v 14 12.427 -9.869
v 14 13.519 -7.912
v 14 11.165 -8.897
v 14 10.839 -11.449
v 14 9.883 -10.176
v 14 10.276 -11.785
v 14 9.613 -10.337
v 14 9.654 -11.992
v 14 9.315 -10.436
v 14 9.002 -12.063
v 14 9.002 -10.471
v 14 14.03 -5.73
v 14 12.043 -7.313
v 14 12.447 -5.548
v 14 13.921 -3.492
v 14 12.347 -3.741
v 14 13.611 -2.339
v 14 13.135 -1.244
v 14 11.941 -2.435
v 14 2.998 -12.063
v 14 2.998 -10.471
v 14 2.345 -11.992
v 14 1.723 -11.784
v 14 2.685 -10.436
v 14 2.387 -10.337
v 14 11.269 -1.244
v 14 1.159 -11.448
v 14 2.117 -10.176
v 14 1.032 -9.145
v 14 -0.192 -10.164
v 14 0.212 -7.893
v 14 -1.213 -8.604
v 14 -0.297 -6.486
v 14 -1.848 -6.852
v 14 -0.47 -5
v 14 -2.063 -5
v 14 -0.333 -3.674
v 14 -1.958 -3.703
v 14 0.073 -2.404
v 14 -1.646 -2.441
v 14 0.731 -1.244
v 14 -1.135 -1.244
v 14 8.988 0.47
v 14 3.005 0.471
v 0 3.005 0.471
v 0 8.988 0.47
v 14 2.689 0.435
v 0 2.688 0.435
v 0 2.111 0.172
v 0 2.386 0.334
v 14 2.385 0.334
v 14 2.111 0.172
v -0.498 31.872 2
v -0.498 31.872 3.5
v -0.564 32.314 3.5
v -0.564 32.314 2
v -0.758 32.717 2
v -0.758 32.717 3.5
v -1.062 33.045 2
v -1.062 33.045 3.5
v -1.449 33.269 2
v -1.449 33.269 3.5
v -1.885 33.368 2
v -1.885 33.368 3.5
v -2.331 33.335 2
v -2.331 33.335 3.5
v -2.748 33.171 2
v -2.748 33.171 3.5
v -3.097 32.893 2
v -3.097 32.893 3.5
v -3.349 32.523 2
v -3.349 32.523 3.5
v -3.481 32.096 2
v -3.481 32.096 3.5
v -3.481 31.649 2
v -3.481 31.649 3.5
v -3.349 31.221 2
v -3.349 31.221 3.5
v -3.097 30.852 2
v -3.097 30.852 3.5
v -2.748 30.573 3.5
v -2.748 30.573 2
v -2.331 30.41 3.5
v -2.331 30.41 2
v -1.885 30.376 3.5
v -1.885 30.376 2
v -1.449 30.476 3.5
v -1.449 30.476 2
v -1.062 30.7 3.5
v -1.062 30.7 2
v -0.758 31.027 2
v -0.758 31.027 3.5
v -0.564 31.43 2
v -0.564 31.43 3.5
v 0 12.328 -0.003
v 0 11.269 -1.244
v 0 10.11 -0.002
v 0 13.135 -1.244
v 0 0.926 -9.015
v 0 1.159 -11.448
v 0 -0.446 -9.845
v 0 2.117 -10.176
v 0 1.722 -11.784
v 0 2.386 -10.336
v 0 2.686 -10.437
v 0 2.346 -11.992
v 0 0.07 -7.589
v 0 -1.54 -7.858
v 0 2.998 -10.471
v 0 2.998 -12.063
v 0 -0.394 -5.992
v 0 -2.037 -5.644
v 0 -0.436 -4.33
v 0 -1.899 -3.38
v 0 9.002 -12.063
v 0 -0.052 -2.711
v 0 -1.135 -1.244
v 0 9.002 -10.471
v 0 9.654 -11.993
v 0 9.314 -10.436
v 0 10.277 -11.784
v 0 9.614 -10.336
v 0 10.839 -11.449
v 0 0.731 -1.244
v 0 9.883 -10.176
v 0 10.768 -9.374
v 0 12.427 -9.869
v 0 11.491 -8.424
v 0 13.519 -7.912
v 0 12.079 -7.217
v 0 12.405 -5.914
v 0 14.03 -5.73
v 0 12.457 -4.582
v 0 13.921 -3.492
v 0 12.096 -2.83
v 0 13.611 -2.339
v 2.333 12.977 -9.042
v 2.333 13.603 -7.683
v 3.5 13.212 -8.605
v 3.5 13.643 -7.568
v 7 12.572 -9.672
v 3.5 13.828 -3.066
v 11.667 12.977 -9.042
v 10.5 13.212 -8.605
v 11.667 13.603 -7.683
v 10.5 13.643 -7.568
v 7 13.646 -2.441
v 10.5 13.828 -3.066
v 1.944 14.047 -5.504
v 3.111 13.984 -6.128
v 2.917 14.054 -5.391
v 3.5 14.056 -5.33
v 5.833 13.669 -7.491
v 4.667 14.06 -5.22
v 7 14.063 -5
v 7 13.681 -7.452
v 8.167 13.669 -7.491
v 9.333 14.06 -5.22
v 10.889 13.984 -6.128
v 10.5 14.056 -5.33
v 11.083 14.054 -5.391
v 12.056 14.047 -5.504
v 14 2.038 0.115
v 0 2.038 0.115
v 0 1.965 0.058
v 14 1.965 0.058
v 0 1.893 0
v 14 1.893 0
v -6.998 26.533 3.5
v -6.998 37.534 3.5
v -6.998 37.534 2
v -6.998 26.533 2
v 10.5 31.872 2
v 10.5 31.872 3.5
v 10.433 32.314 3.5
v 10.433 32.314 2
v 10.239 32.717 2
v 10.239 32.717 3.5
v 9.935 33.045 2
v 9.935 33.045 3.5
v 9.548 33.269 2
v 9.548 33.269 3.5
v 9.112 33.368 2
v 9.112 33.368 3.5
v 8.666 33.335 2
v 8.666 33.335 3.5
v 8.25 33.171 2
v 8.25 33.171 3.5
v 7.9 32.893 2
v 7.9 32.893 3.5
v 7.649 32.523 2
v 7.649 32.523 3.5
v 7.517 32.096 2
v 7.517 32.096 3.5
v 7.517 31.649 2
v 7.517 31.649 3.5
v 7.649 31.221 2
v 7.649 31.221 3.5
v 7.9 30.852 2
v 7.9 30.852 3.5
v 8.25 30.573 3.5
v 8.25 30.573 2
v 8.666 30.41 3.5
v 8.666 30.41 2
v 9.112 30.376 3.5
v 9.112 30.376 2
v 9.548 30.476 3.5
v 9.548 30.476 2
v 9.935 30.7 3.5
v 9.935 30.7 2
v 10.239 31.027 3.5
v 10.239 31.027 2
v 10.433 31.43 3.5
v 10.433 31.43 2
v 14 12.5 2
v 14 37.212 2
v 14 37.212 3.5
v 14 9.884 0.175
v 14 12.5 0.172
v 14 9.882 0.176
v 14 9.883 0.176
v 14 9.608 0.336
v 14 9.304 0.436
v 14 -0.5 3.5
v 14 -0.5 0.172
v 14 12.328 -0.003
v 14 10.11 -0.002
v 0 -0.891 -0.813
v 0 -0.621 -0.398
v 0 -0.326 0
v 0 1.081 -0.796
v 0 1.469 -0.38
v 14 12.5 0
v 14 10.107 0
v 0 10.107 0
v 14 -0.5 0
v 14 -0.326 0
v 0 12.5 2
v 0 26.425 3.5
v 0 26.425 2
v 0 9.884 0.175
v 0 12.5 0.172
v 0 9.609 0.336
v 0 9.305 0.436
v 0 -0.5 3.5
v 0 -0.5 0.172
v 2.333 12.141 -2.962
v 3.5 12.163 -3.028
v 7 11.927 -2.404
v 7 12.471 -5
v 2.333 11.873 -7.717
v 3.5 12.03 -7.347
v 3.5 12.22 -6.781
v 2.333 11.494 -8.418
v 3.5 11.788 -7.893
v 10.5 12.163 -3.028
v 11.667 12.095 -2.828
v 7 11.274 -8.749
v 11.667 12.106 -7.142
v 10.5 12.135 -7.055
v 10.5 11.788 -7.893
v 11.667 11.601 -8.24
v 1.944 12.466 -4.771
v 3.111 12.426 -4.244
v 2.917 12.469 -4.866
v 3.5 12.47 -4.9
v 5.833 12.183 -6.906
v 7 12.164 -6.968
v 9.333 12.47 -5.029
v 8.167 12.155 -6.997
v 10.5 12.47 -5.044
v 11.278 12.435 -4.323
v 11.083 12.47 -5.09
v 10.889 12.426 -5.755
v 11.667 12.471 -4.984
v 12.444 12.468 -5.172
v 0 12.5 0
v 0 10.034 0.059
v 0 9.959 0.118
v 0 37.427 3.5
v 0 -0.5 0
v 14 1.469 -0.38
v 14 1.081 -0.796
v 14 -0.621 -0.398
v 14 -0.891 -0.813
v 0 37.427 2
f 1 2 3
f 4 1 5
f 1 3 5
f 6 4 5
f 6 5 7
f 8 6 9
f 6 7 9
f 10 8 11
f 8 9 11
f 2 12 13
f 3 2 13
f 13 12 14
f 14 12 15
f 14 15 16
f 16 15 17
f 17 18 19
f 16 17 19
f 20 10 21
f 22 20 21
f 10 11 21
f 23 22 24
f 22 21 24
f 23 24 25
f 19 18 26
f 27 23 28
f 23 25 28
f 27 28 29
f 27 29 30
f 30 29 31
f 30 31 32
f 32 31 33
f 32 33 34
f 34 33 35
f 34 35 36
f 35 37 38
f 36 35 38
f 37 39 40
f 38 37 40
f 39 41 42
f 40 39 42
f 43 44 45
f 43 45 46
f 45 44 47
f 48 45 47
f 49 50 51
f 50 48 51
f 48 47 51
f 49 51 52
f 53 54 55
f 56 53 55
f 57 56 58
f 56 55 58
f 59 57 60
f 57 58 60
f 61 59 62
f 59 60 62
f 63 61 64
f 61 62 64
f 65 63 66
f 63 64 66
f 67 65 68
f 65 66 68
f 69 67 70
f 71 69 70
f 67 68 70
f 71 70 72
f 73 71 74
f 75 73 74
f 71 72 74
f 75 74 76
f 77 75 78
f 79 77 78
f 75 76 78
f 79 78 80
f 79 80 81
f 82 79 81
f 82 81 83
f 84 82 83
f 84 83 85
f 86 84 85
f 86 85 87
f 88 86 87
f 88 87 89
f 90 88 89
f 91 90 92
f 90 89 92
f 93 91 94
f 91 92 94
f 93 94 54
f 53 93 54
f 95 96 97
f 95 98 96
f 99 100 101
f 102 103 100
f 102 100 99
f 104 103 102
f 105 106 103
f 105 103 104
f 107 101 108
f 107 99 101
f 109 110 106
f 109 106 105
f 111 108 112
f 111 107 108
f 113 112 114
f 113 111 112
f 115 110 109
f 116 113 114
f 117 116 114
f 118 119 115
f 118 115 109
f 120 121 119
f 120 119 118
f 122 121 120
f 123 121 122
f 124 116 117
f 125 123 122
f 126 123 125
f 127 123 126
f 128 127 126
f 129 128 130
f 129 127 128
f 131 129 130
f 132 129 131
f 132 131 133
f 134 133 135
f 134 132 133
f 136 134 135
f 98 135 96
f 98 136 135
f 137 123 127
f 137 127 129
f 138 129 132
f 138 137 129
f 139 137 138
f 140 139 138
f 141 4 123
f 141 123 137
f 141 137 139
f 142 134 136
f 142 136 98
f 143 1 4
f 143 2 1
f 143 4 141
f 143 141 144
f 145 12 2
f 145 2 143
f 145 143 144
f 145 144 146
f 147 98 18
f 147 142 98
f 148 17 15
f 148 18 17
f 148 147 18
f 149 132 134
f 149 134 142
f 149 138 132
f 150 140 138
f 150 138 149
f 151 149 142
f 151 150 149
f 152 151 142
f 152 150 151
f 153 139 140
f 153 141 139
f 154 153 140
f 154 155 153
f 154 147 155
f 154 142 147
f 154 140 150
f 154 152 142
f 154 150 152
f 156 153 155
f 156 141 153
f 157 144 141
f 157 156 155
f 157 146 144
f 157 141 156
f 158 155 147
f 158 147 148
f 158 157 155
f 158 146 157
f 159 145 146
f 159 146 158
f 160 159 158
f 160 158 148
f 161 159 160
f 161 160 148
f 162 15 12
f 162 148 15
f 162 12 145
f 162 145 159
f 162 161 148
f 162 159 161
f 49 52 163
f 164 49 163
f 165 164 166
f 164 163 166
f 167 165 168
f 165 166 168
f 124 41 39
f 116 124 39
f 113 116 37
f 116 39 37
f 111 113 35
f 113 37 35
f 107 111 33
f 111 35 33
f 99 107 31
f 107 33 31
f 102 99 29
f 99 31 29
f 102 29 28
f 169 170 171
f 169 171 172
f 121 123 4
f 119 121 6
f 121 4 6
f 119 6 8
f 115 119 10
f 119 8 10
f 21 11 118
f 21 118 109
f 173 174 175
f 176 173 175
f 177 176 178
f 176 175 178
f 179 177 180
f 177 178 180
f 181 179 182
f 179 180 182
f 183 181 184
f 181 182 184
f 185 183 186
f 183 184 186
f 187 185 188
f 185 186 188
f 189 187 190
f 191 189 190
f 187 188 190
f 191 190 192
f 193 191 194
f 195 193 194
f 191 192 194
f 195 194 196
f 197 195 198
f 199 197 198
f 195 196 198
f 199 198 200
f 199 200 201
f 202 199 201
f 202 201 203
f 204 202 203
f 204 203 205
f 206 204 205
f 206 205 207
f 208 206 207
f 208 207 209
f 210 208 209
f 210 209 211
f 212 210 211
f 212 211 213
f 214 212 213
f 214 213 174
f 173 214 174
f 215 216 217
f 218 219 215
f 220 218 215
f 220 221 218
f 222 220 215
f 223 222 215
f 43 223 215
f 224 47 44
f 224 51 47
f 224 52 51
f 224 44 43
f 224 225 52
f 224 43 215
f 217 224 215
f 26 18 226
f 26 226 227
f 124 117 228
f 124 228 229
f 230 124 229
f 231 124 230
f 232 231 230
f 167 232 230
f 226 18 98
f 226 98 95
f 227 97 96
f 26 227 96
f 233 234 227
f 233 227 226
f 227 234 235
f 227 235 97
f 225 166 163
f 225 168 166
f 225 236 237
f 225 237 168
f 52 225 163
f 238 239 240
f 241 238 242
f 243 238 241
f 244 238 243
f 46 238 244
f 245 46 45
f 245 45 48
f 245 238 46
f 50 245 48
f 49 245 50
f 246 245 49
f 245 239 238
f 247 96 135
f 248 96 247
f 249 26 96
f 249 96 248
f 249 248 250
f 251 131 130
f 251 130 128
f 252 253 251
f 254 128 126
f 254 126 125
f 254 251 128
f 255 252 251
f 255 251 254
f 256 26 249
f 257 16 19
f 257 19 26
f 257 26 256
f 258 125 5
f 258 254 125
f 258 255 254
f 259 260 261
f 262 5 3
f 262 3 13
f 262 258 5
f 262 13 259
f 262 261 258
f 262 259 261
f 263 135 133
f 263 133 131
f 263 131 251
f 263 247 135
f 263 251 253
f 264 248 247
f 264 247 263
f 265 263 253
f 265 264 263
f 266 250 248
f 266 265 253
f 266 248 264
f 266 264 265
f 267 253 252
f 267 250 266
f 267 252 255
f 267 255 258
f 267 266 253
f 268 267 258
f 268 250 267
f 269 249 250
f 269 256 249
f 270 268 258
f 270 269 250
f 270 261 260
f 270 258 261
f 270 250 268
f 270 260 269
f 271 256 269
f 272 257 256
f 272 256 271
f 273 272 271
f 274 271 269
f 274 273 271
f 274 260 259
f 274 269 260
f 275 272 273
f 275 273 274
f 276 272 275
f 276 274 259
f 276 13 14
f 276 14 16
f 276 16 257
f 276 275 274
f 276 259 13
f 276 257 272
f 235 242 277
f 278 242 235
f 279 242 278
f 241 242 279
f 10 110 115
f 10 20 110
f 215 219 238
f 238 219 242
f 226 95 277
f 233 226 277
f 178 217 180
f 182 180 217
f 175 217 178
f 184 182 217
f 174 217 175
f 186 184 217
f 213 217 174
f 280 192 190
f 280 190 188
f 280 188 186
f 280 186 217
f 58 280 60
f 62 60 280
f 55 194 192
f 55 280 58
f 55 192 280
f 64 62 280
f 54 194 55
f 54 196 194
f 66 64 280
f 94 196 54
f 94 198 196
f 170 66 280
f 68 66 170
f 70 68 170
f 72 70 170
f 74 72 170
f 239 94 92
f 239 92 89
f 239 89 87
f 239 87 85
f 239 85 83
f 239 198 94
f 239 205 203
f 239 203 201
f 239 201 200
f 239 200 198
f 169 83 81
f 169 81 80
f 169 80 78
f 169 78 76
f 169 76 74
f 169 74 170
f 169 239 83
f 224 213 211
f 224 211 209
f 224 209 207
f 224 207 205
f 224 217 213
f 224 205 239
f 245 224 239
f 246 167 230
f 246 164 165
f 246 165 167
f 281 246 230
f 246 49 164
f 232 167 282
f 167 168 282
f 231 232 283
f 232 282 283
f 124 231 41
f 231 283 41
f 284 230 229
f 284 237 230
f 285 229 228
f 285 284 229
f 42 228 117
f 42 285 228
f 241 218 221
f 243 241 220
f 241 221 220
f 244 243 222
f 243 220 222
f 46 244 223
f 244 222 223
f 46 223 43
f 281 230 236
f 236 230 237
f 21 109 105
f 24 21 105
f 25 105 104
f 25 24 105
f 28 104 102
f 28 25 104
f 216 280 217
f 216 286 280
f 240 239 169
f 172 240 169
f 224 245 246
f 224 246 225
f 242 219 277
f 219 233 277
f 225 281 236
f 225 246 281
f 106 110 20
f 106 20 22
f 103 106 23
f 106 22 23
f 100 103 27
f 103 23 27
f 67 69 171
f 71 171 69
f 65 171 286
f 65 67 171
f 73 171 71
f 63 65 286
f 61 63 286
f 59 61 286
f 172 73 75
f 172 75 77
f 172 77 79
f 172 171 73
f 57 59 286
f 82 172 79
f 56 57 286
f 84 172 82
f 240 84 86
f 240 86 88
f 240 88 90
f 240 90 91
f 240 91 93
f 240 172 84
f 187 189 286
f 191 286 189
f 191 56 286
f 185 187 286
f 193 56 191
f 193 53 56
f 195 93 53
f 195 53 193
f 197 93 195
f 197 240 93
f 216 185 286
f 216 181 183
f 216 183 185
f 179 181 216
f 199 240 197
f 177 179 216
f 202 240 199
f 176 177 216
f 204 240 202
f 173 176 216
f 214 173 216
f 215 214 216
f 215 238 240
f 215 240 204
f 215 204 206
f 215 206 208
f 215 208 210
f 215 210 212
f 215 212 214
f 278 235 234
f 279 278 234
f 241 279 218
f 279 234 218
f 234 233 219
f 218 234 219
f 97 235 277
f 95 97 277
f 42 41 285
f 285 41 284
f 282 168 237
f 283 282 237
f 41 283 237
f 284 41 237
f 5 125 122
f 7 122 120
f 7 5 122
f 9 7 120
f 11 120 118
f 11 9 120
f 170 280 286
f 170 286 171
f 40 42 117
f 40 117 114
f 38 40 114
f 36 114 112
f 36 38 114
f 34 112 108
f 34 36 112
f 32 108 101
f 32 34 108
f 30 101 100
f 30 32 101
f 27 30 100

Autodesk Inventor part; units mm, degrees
ref_plane "YZ Plane" through (0, 0, 0) normal (1, 0, 0) x (0, 1, 0)
ref_plane "XZ Plane" through (0, 0, 0) normal (0, 1, 0) x (-1, 0, 0)
sketch "Sketch1" plane through (0, 0, 0) normal (0, 0, 1) x (1, 0, 0)
  line L0 (1, 9) -> (14, 9) projected
  line L1 (1, 3) -> (1, 9) projected
  line L2 (14, 3) -> (1, 3) projected
  line L3 (14, 9) -> (14, 3) projected
  line L4 (1, 12) -> (14, 12)
  line L5 (1, 0) -> (14, 0)
  line L6 (1, 12.5) -> (14, 12.5)
  line L7 (1, -0.5) -> (14, -0.5)
  line L8 (0, 1.4) -> (0, 10.6) projected
  line L9 (0, -0.5) -> (14, -0.5)
  line L10 (14, -0.5) -> (14, 12.5)
  line L11 (14, 12.5) -> (0, 12.5)
  line L12 (0, 12.5) -> (0, -0.5)
  point P0 (0, 0)
  dimension "d0" = 0.5
  dimension "d1" = 0.5
extrude "Extrusion1" add sketch "Sketch1" along normal blind 2
sketch "Sketch2" plane through (14, -0.5, 0) normal (1, 0, 0) x (0, 0, -1)
  line L0 (10, 9.5) -> (10, 3.5) projected
  line L1 (10.5, 9.5) -> (10.5, 3.5)
  line L2 (0, 13) -> (0, 0) projected
  line L3 (0.0028, 13) -> (0, 0)
  arc A0 (5, 0.5) -> (9.8, 2.9) centre (5, 6.5) ccw projected
  spline S0 degree 3 poles (9.8, 10.1) (9.3822, 10.6561) (8.439, 11.5426) (6.738, 12.3306) (5.0002, 12.5848) (3.2616, 12.3308) (1.5615, 11.5422) (0.6175, 10.6564) (0.2, 10.1) knots 0.000048 0.000048 0.000048 0.000048 1.982593 3.634064 5.285536 6.937008 8.58848 10.571071 10.571071 10.571071 10.571071 weights 1 1 1 1 1 1 1 1 1 projected
  arc A1 (0.2, 2.9) -> (5, 0.5) centre (5, 6.5) ccw projected
  ellipse E0 centre (0.7683, 3.4229) end of major axis (0.4925, 4.2518) minor radius 0.7558 (0, 3.5) -> (0.2, 2.9) ccw projected
  ellipse E1 centre (0.7685, 9.5775) end of major axis (1.0457, 10.4061) minor radius 0.7558 (0.2, 10.1) -> (0, 9.5) ccw projected
  ellipse E2 centre (9.2317, 3.4229) end of major axis (9.5075, 4.2518) minor radius 0.7558 (9.8, 2.9) -> (10, 3.5) ccw projected
  ellipse E3 centre (9.2318, 9.5768) end of major axis (8.9568, 10.4058) minor radius 0.7558 (10, 9.5) -> (9.7999, 10.1) ccw projected
  arc A2 (5, 0.0295) -> (10.1758, 2.6168) centre (5, 6.5) ccw
  arc A3 (-0.1717, 2.6115) -> (5, 0.0295) centre (5, 6.5) ccw
  line L4 (10.4705, 3.4977) -> (10.4705, 9.5023)
  ellipse E4 centre (0.7683, 3.4229) end of major axis (0.3339, 4.718) minor radius 1.2242 (-0.4709, 3.5051) -> (-0.1717, 2.6115) ccw
  ellipse E5 centre (0.7685, 9.5775) end of major axis (1.1957, 10.8767) minor radius 1.2233 (-0.1748, 10.3845) -> (-0.4697, 9.4882) ccw
  arc A4 (0.2, 2.9) -> (9.8, 2.9) centre (5, 6.5) ccw projected
  arc A5 (5, -1.5631) -> (11.4481, 1.6589) centre (5, 6.5) ccw
  arc A6 (-1.4235, 1.6263) -> (5, -1.5631) centre (5, 6.5) ccw
  line L5 (12.0631, 3.4977) -> (12.0631, 9.5023)
  ellipse E6 centre (0.7683, 3.4229) end of major axis (-0.2657, 6.5587) minor radius 2.7801 (-2.0629, 3.5774) -> (-1.4235, 1.6263) ccw
  ellipse E7 centre (0.7685, 9.5775) end of major axis (1.7896, 12.7173) minor radius 2.7798 (-1.4322, 11.3622) -> (-2.0617, 9.4138) ccw
  line L6 (-0.4709, 3.5051) -> (-0.4697, 9.4882)
  line L7 (-2.0629, 3.5774) -> (-2.0617, 9.4138)
  spline S1 degree 5 poles (10.1762, 10.3826) (9.455, 11.3411) (8.5153, 12.1382) (7.3995, 12.6912) (5.0003, 13.2497) (2.6, 12.6917) (1.4857, 12.137) (0.5444, 11.3415) (-0.1764, 10.3824) knots 0 0 0 0 0 0 0.499984 0.499984 0.499984 1 1 1 1 1 1
  spline S2 degree 3 poles (10.1759, 2.6167) (10.3655, 2.8683) (10.4707, 3.1827) (10.4707, 3.4977) knots 0 0 0 0 1 1 1 1
  spline S3 degree 3 poles (10.4707, 9.5023) (10.4707, 9.8173) (10.3655, 10.1318) (10.1757, 10.3833) knots 0 0 0 0 1 1 1 1
  spline S4 degree 4 poles (11.4481, 1.6589) (11.7448, 2.0529) (11.9559, 2.5113) (12.0631, 3.0045) (12.0631, 3.4977) knots 0 0 0 0 0 1 1 1 1 1
  spline S5 degree 4 poles (12.0631, 9.5023) (12.0631, 9.995) (11.9561, 10.4877) (11.7455, 10.9457) (11.4492, 11.3395) knots 0 0 0 0 0 1 1 1 1 1
  spline S6 degree 5 poles (11.4495, 11.3391) (10.5511, 12.5335) (9.3795, 13.5256) (7.9898, 14.2154) (5.0062, 14.9093) (2.0215, 14.2187) (0.6377, 13.5325) (-0.5334, 12.5493) (-1.4322, 11.3622) knots 0 0 0 0 0 0 0.500955 0.500955 0.500955 1 1 1 1 1 1
  point P0 (0, 0.5)
  point P1 (0, 10.6069)
  point P2 (0, 12.8255)
  point P3 (0, 0.1744)
  point P4 (0, 2.393)
  point P5 (0.0005, 2.3924)
  point P6 (0, 0.1743)
  point P7 (0.0027, 12.8276)
  point P8 (0.0023, 10.6096)
extrude "Extrusion2" add sketch "Sketch2" along normal blind 2 contours L3 S6 S5 L5 S4 A5 A6 L2 A3 A2 S2 L4 S3 S1 | S1 E5 L6 E4 A3 L2 A6 E6 L7 E7 S6
sketch "Sketch3" plane through (14, 1.893, 0) normal (1, 0, 0) x (0, 0, -1)
  arc A0 (-0.1717, 0.2185) -> (0, 0) centre (5, 4.107) ccw projected
  line L0 (0, 0) -> (0, 8.2139) projected
  arc A1 (0, 8.2139) -> (-0.1748, 7.9915) centre (4.9785, 4.1209) ccw projected
  ellipse E0 centre (0.7685, 7.1845) end of major axis (0.3413, 5.8853) minor radius 1.2233 (-0.1748, 7.9915) -> (-0.4697, 7.0952) ccw projected
  line L1 (-0.4697, 7.0952) -> (-0.4709, 1.1121) projected
  ellipse E1 centre (0.7683, 1.03) end of major axis (1.2028, -0.2651) minor radius 1.2242 (-0.4709, 1.1121) -> (-0.1717, 0.2185) ccw projected
  point P0 (0, -1.893)
extrude "Extrusion3" cut sketch "Sketch3" against normal through all
sketch "Sketch4" plane through (14, -0.5, 0) normal (-1, 0, 0) x (0, 0, 1)
  line L0 (-10.4705, 9.5023) -> (-10.4705, 3.4977) projected
  ellipse E0 centre (-9.2512, 9.5832) end of major axis (-8.8307, 10.8511) minor radius 1.2058 (-10.1756, 10.3833) -> (-10.4705, 9.5023) ccw projected
  spline S0 degree 5 poles (-0.0023, 10.6096) (-0.7281, 11.4914) (-1.6474, 12.2152) (-2.7157, 12.7179) (-5.0579, 13.2362) (-7.3991, 12.6912) (-8.5148, 12.1385) (-9.4545, 11.3415) (-10.1756, 10.3833) knots 0 0 0 0 0 0 0.487709 0.487709 0.487709 1 1 1 1 1 1 projected
  line L1 (-0.0027, 12.8276) -> (-0.0023, 10.6096) projected
  spline S1 degree 5 poles (-11.4492, 11.3395) (-10.5511, 12.5335) (-9.3795, 13.5256) (-7.9898, 14.2154) (-5.4174, 14.8137) (-2.8441, 14.3827) (-1.8061, 14.0228) (-0.8486, 13.496) (-0.0027, 12.8277) knots 0 0 0 0 0 0 0.581033 0.581033 0.581033 1 1 1 1 1 1 projected
  ellipse E1 centre (-9.2769, 9.5918) end of major axis (-8.3583, 12.3614) minor radius 2.7713 (-11.4492, 11.3395) -> (-12.0631, 9.5023) ccw projected
  line L2 (-12.0631, 3.4977) -> (-12.0631, 9.5023) projected
  ellipse E2 centre (-9.2769, 3.4079) end of major axis (-10.1984, 6.1767) minor radius 2.7712 (-12.0631, 3.4977) -> (-11.4481, 1.6589) ccw projected
  arc A0 (-11.4481, 1.6589) -> (0, 0.1743) centre (-5, 6.5) ccw projected
  line L3 (-0.0005, 2.3924) -> (0, 0.1743) projected
  arc A1 (-10.1758, 2.6168) -> (-0.0005, 2.3924) centre (-5, 6.5) ccw projected
  ellipse E3 centre (-9.2512, 3.4164) end of major axis (-9.673, 4.684) minor radius 1.2058 (-10.4705, 3.4977) -> (-10.1758, 2.6168) ccw projected
  point P0 (0, 0.5)
extrude "Extrusion4" add sketch "Sketch4" along normal up to surface (14 mm away)
sketch "Sketch5" plane through (0, -0.5, 0) normal (0, -1, 0) x (1, 0, 0)
  line L0 (0, 2) -> (14, 2) projected
  line L1 (0, 2) -> (14, 2)
  line L2 (14, 2) -> (14, 3.5)
  line L3 (14, 3.5) -> (0, 3.5)
  line L4 (0, 3.5) -> (0, 2)
  point P0 (0, 0)
  dimension "d22" = 1.5
ref_plane "Work Plane1" through (-71.4012, 38.5222, -12.5) normal (0.0153412, 0.9998823, 0) x (0, 0, 1)
extrude "Extrusion5" add sketch "Sketch5" against normal up to surface surface through (-71.4012, 38.5222, -12.5) normal (0.0153412, 0.9998823, 0)
sketch "Sketch6" plane through (0, -0.5, 3.5) normal (0, 0, 1) x (1, 0, 0)
  line L0 (14, 0) -> (14, 37.7119) projected
  line L1 (14, 37.7119) -> (0, 37.9267) projected
  line L2 (-54.2389, 27.7576) -> (-67.6625, 27.9635) projected
  line L3 (14, 37.7119) -> (14, 26.7106)
  line L4 (14, 13) -> (14, 37.7119) projected
  line L5 (14, 26.7106) -> (-6.9975, 27.0328)
  line L6 (14, 37.7119) -> (-6.9975, 38.034)
  line L7 (-6.9975, 38.034) -> (-6.9975, 27.0328)
  point P0 (0, 0.5)
  point P1 (4.9084, 26.8501)
  dimension "d25" = 21
  dimension "d26" = 21
extrude "Extrusion6" add sketch "Sketch6" against normal blind 1.5
sketch "Sketch7" plane through (0, -0.5, 3.5) normal (0, 0, 1) x (1, 0, 0)
  line L0 (14, 0) -> (14, 37.7119) projected
  line L1 (14, -3.9463) -> (21.7341, -3.9463)
  line L2 (21.7341, -3.9463) -> (21.7341, 19.3789)
  line L3 (21.7341, 19.3789) -> (14, 19.3789)
  line L4 (14, 19.3789) -> (14, -3.9463)
  point P0 (0, 0.5)
extrude "Extrusion7" cut sketch "Sketch7" against normal blind 15.75
sketch "Sketch8" plane through (14, 10.1069, 0) normal (1, 0, 0) x (0, 0, -1)
  ellipse E0 centre (9.2512, -1.0236) end of major axis (8.8307, 0.2442) minor radius 1.2058 (10.4705, -1.1046) -> (10.1756, -0.2236) ccw projected
  line L0 (10.4705, -7.1091) -> (10.4705, -1.1046) projected
  ellipse E1 centre (9.2512, -7.1904) end of major axis (9.673, -5.9229) minor radius 1.2058 (10.1758, -7.9901) -> (10.4705, -7.1091) ccw projected
  arc A0 (0.0005, -8.2145) -> (10.1758, -7.9901) centre (5, -4.1069) ccw projected
  line L1 (0, -10.4326) -> (0.0005, -8.2145) projected
  arc A1 (0, -10.4326) -> (11.4481, -8.948) centre (5, -4.1069) ccw projected
  ellipse E2 centre (9.2769, -7.199) end of major axis (10.1984, -4.4302) minor radius 2.7712 (11.4481, -8.948) -> (12.0631, -7.1091) ccw projected
  line L2 (12.0631, -1.1046) -> (12.0631, -7.1091) projected
  ellipse E3 centre (9.2769, -1.0151) end of major axis (8.3583, 1.7545) minor radius 2.7713 (12.0631, -1.1046) -> (11.4492, 0.7326) ccw projected
  spline S0 degree 5 poles (0.0027, 2.2208) (0.8486, 2.8891) (1.8061, 3.4159) (2.8441, 3.7759) (5.4174, 4.2068) (7.9898, 3.6085) (9.3795, 2.9188) (10.5511, 1.9266) (11.4492, 0.7326) knots 0 0 0 0 0 0 0.418967 0.418967 0.418967 1 1 1 1 1 1 projected
  line L3 (0.0023, 0.0028) -> (0.0027, 2.2208) projected
  spline S1 degree 5 poles (10.1756, -0.2236) (9.4545, 0.7346) (8.5148, 1.5316) (7.3991, 2.0844) (5.0579, 2.6294) (2.7157, 2.111) (1.6474, 1.6084) (0.7281, 0.8845) (0.0023, 0.0027) knots 0 0 0 0 0 0 0.512291 0.512291 0.512291 1 1 1 1 1 1 projected
  arc A2 (-0.1717, -7.9954) -> (0, -8.2139) centre (5, -4.1069) ccw projected
  ellipse E4 centre (0.7683, -7.184) end of major axis (1.2028, -8.479) minor radius 1.2242 (-0.4709, -7.1018) -> (-0.1717, -7.9954) ccw projected
  ellipse E5 centre (0.7685, -1.0294) end of major axis (0.3413, -2.3286) minor radius 1.2233 (-0.1748, -0.2224) -> (-0.4697, -1.1187) ccw projected
  arc A3 (0, 0) -> (-0.1748, -0.2224) centre (4.9785, -4.093) ccw projected
  line L4 (-0.4697, -1.1187) -> (-0.4709, -7.1018) projected
  line L5 (0, 0) -> (0, 2.3931) projected
  line L6 (0, 2.3931) -> (-2, 2.3931) projected
  line L7 (0, -10.6069) -> (0, -8.2139) projected
  line L8 (0, -10.6069) -> (-3.5, -10.6069) projected
  line L9 (1.2443, -11.2419) -> (1.2443, -9.3759)
  arc A4 (0.0005, -8.2145) -> (10.1758, -7.9901) centre (5, -4.1069) ccw projected
  arc A5 (0.0005, -8.2145) -> (1.2443, -9.3759) centre (4.9979, -4.1091) ccw
  line L10 (0, -8.2139) -> (-0.1717, -7.9954)
  ellipse E6 centre (0.7683, -7.184) end of major axis (1.2028, -8.479) minor radius 1.2242 (-0.4709, -7.1018) -> (-0.1717, -7.9954) ccw projected
  line L11 (-0.1717, -7.9954) -> (-0.1717, -10.6069)
  line L12 (0, -10.6069) -> (-0.1717, -10.6069)
  line L13 (0, -10.6069) -> (0, -10.4326)
  arc A6 (0, -10.4326) -> (1.2443, -11.2419) centre (5, -4.1069) ccw
  line L14 (1.2444, 1.1622) -> (1.2444, 3.0282)
  arc A7 (1.2444, 3.0282) -> (0.0027, 2.2208) centre (4.9892, -4.0883) ccw
  line L15 (0, 2.3931) -> (0, 0) projected
  line L16 (0.0027, 2.2208) -> (0, 2.3931)
  line L17 (0, 2.3931) -> (-0.1717, 2.3931)
  line L18 (-0.1717, 2.3931) -> (-0.1748, -0.2224)
  line L19 (-0.1748, -0.2224) -> (0.0023, 0.0028)
  line L20 (0.0005, -8.2145) -> (0, -8.2139)
  point P0 (0, -10.1069)
extrude "Extrusion8" add sketch "Sketch8" against normal up to surface (14 mm away) contours S1 L3 S0 L14 | L19 L5 L16 L3 | L9 A1 L1 A0 | A3 L18 L6 L5 | L1 L7 L8 L11 A2
sketch "Sketch9" plane through (0, -0.5, 3.5) normal (0, 0, 1) x (1, 0, 0)
  line L0 (0, 0) -> (0, 26.9254) projected
  line L1 (14, 0) -> (0, 0) projected
  line L2 (14, 0) -> (14, 37.7119) projected
  line L3 (14, 37.7119) -> (-6.9975, 38.034) projected
  line L4 (-6.9975, 38.034) -> (-6.9975, 27.0328) projected
  line L5 (-6.9975, 27.0328) -> (0, 26.9254) projected
  line L6 (-6.9975, 38.034) -> (14, 37.7119) projected
  line L7 (-6.9975, 38.034) -> (14, 26.7132)
  line L8 (14, 13) -> (14, 37.7119) projected
  line L9 (14, 37.7119) -> (-6.9975, 27.0328)
  line L10 (-6.9975, 38.034) -> (-6.9975, 27.0328) projected
  line L11 (-6.9975, 32.3723) -> (14, 32.3723)
  line L12 (-6.9975, 32.3723) -> (0.0025, 32.3723)
  line L13 (14, 32.3723) -> (7, 32.3723)
  line L14 (-6.9975, 32.3723) -> (-1.9975, 32.3723)
  line L15 (14, 32.3723) -> (9, 32.3723)
  circle A0 centre (-1.9975, 32.3723) radius 1.5
  circle A1 centre (9, 32.3723) radius 1.5
  point P0 (0, 0.5)
  dimension "d35" = 5
  dimension "d36" = 5
  dimension "d37" = 3
  dimension "d38" = 3
extrude "Extrusion9" cut sketch "Sketch9" against normal blind 3 contours A0 L11 | L11 A0 | A1 L11 | L11 A1
equation "\"d39\" = d37"
properties part number "leftWheeler_3DPrint"
